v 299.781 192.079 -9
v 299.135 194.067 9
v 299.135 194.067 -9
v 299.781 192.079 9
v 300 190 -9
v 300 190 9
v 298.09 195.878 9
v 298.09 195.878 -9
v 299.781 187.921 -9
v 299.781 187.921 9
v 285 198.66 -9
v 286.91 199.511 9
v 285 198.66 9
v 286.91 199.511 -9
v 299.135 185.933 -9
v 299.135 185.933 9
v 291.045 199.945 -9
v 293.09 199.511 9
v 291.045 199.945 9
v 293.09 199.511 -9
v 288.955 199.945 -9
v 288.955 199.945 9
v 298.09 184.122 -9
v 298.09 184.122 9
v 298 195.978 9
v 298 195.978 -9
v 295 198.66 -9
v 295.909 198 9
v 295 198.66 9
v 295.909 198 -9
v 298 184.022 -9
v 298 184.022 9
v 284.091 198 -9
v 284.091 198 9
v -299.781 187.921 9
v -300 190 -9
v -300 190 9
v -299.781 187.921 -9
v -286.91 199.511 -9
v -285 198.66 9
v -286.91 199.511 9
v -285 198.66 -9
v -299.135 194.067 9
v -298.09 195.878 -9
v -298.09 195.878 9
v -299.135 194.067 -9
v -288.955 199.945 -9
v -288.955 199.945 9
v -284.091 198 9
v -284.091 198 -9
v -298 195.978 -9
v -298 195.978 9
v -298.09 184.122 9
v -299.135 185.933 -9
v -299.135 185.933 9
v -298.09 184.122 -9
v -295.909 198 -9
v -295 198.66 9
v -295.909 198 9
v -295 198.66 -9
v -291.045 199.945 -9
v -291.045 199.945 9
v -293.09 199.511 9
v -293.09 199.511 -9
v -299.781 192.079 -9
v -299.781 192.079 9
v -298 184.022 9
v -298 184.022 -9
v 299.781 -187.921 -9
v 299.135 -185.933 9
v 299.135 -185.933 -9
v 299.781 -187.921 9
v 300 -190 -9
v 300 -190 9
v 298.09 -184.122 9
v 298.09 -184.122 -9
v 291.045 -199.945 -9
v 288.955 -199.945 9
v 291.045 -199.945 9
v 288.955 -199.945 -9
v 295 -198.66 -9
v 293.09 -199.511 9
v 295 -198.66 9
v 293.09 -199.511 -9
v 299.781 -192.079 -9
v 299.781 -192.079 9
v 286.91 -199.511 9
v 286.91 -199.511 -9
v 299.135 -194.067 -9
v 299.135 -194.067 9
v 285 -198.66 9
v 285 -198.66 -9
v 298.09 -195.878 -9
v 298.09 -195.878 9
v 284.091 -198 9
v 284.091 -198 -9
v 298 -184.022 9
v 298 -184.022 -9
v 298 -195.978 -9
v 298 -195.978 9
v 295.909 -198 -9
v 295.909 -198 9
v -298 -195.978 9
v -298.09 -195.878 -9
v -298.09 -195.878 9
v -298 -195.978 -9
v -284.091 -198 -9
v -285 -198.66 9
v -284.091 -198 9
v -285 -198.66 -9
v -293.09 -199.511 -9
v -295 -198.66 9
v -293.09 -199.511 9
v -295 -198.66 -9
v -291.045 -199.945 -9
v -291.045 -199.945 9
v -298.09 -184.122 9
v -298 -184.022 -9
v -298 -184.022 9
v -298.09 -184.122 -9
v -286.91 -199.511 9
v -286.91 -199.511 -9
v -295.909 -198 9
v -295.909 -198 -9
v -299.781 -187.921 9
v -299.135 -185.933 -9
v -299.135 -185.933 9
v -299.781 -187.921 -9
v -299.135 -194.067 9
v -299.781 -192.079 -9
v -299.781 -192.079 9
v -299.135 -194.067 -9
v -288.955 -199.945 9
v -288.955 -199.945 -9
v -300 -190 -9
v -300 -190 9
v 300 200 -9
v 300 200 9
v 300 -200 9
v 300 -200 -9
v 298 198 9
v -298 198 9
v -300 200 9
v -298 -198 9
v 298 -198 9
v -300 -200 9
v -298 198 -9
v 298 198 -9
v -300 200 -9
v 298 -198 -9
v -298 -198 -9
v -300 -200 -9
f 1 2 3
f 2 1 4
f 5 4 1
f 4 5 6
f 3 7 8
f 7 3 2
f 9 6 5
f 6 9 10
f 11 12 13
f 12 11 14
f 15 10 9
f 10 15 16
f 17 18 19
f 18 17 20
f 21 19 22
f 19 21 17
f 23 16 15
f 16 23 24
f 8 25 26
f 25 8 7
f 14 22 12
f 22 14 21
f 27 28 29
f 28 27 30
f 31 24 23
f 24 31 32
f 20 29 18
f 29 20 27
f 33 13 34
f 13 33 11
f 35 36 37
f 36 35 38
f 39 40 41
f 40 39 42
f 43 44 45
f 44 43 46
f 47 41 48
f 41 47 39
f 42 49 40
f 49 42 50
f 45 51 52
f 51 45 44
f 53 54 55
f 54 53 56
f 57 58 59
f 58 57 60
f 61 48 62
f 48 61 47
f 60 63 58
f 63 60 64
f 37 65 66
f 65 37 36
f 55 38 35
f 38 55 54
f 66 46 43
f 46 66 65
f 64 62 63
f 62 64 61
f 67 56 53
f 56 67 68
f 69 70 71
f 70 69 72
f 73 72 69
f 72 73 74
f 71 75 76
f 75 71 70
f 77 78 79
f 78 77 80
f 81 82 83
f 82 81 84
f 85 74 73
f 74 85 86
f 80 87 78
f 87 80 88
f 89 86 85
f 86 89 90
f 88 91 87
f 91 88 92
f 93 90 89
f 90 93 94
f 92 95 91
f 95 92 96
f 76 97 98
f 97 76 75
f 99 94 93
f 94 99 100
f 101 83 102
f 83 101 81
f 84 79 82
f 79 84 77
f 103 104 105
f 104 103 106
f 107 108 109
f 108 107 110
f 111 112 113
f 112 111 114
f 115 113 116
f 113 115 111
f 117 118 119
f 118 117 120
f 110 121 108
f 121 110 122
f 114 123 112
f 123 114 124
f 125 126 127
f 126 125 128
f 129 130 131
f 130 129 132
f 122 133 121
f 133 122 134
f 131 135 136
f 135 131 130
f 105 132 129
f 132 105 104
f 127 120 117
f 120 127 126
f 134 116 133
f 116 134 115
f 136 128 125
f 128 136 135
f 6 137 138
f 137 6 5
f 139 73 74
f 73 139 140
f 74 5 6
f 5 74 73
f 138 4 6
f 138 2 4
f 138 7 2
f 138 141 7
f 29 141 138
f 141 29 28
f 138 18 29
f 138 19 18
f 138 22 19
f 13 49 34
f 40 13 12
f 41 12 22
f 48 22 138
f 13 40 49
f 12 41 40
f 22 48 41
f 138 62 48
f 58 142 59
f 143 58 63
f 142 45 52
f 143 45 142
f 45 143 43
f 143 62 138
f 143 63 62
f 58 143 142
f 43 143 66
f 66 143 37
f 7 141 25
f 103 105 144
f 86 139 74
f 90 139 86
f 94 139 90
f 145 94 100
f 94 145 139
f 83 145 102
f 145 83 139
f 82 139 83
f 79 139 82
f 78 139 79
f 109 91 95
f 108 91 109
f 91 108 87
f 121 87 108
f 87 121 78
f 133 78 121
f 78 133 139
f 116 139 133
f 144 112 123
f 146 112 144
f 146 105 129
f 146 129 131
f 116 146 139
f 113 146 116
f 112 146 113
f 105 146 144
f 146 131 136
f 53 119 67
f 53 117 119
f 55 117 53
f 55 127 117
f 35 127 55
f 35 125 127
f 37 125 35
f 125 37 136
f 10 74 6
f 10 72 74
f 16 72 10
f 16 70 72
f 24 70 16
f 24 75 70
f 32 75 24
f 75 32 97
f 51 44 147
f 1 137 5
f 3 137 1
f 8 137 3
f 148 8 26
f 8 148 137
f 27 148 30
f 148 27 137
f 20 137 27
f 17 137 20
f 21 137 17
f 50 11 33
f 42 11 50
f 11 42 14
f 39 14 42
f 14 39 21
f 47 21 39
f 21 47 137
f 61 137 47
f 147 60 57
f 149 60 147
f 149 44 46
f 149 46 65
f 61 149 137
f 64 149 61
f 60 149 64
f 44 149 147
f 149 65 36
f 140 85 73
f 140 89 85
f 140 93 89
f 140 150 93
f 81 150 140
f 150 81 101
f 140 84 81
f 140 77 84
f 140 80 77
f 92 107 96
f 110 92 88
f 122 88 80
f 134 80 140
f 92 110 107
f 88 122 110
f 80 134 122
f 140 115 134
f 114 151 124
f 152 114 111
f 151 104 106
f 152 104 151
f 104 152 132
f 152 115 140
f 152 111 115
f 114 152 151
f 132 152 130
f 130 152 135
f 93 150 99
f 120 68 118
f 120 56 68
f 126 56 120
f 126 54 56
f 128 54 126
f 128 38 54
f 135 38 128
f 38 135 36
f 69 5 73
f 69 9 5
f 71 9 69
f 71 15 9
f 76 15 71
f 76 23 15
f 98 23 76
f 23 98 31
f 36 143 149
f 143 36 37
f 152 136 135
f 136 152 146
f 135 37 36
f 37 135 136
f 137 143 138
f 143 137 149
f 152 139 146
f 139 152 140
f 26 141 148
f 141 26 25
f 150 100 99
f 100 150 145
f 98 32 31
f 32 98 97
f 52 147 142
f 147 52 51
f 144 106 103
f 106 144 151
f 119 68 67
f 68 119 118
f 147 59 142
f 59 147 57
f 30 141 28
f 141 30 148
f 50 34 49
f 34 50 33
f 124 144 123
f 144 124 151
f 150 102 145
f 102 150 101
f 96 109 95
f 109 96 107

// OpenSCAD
// Parameters
sheet_length = 600; //[300:1200:1]
sheet_width = 400; //[200:800:1]
sheet_thickness = 18; //[9:36:1]
edge_chamfer_size = 2; //[1:6:1]
corner_round_radius = 10; //[2:40:1]
corner_cut_height = 40; //[10:120:1]
overlap = 1; //[0.5:2:0.5]

// Base Shapes
module mdf_sheet_body() {
  cube([sheet_length, sheet_width, sheet_thickness], center=true);
}

module edge_chamfer() {
  cube([sheet_length - 2*edge_chamfer_size, sheet_width - 2*edge_chamfer_size, sheet_thickness + 2*overlap], center=true);
}

module corner_rounding() {
  cylinder(r=corner_round_radius, h=corner_cut_height, center=true);
}

// Operations
module corner_rounding_all() {
  union() {
    translate([sheet_length/2 - corner_round_radius, sheet_width/2 - corner_round_radius, 0]) corner_rounding();
    translate([-(sheet_length/2 - corner_round_radius), sheet_width/2 - corner_round_radius, 0]) corner_rounding();
    translate([sheet_length/2 - corner_round_radius, -(sheet_width/2 - corner_round_radius), 0]) corner_rounding();
    translate([-(sheet_length/2 - corner_round_radius), -(sheet_width/2 - corner_round_radius), 0]) corner_rounding();
  }
}

module mdf_sheet_with_features() {
  difference() {
    mdf_sheet_body();
    edge_chamfer();
    corner_rounding_all();
  }
}

module final_model() {
  union() {
    mdf_sheet_with_features();
    // Ignoring material_label_text as per rules
  }
}

// Final Output
color([0.85, 0.85, 0.8]) final_model(); // MDF color
